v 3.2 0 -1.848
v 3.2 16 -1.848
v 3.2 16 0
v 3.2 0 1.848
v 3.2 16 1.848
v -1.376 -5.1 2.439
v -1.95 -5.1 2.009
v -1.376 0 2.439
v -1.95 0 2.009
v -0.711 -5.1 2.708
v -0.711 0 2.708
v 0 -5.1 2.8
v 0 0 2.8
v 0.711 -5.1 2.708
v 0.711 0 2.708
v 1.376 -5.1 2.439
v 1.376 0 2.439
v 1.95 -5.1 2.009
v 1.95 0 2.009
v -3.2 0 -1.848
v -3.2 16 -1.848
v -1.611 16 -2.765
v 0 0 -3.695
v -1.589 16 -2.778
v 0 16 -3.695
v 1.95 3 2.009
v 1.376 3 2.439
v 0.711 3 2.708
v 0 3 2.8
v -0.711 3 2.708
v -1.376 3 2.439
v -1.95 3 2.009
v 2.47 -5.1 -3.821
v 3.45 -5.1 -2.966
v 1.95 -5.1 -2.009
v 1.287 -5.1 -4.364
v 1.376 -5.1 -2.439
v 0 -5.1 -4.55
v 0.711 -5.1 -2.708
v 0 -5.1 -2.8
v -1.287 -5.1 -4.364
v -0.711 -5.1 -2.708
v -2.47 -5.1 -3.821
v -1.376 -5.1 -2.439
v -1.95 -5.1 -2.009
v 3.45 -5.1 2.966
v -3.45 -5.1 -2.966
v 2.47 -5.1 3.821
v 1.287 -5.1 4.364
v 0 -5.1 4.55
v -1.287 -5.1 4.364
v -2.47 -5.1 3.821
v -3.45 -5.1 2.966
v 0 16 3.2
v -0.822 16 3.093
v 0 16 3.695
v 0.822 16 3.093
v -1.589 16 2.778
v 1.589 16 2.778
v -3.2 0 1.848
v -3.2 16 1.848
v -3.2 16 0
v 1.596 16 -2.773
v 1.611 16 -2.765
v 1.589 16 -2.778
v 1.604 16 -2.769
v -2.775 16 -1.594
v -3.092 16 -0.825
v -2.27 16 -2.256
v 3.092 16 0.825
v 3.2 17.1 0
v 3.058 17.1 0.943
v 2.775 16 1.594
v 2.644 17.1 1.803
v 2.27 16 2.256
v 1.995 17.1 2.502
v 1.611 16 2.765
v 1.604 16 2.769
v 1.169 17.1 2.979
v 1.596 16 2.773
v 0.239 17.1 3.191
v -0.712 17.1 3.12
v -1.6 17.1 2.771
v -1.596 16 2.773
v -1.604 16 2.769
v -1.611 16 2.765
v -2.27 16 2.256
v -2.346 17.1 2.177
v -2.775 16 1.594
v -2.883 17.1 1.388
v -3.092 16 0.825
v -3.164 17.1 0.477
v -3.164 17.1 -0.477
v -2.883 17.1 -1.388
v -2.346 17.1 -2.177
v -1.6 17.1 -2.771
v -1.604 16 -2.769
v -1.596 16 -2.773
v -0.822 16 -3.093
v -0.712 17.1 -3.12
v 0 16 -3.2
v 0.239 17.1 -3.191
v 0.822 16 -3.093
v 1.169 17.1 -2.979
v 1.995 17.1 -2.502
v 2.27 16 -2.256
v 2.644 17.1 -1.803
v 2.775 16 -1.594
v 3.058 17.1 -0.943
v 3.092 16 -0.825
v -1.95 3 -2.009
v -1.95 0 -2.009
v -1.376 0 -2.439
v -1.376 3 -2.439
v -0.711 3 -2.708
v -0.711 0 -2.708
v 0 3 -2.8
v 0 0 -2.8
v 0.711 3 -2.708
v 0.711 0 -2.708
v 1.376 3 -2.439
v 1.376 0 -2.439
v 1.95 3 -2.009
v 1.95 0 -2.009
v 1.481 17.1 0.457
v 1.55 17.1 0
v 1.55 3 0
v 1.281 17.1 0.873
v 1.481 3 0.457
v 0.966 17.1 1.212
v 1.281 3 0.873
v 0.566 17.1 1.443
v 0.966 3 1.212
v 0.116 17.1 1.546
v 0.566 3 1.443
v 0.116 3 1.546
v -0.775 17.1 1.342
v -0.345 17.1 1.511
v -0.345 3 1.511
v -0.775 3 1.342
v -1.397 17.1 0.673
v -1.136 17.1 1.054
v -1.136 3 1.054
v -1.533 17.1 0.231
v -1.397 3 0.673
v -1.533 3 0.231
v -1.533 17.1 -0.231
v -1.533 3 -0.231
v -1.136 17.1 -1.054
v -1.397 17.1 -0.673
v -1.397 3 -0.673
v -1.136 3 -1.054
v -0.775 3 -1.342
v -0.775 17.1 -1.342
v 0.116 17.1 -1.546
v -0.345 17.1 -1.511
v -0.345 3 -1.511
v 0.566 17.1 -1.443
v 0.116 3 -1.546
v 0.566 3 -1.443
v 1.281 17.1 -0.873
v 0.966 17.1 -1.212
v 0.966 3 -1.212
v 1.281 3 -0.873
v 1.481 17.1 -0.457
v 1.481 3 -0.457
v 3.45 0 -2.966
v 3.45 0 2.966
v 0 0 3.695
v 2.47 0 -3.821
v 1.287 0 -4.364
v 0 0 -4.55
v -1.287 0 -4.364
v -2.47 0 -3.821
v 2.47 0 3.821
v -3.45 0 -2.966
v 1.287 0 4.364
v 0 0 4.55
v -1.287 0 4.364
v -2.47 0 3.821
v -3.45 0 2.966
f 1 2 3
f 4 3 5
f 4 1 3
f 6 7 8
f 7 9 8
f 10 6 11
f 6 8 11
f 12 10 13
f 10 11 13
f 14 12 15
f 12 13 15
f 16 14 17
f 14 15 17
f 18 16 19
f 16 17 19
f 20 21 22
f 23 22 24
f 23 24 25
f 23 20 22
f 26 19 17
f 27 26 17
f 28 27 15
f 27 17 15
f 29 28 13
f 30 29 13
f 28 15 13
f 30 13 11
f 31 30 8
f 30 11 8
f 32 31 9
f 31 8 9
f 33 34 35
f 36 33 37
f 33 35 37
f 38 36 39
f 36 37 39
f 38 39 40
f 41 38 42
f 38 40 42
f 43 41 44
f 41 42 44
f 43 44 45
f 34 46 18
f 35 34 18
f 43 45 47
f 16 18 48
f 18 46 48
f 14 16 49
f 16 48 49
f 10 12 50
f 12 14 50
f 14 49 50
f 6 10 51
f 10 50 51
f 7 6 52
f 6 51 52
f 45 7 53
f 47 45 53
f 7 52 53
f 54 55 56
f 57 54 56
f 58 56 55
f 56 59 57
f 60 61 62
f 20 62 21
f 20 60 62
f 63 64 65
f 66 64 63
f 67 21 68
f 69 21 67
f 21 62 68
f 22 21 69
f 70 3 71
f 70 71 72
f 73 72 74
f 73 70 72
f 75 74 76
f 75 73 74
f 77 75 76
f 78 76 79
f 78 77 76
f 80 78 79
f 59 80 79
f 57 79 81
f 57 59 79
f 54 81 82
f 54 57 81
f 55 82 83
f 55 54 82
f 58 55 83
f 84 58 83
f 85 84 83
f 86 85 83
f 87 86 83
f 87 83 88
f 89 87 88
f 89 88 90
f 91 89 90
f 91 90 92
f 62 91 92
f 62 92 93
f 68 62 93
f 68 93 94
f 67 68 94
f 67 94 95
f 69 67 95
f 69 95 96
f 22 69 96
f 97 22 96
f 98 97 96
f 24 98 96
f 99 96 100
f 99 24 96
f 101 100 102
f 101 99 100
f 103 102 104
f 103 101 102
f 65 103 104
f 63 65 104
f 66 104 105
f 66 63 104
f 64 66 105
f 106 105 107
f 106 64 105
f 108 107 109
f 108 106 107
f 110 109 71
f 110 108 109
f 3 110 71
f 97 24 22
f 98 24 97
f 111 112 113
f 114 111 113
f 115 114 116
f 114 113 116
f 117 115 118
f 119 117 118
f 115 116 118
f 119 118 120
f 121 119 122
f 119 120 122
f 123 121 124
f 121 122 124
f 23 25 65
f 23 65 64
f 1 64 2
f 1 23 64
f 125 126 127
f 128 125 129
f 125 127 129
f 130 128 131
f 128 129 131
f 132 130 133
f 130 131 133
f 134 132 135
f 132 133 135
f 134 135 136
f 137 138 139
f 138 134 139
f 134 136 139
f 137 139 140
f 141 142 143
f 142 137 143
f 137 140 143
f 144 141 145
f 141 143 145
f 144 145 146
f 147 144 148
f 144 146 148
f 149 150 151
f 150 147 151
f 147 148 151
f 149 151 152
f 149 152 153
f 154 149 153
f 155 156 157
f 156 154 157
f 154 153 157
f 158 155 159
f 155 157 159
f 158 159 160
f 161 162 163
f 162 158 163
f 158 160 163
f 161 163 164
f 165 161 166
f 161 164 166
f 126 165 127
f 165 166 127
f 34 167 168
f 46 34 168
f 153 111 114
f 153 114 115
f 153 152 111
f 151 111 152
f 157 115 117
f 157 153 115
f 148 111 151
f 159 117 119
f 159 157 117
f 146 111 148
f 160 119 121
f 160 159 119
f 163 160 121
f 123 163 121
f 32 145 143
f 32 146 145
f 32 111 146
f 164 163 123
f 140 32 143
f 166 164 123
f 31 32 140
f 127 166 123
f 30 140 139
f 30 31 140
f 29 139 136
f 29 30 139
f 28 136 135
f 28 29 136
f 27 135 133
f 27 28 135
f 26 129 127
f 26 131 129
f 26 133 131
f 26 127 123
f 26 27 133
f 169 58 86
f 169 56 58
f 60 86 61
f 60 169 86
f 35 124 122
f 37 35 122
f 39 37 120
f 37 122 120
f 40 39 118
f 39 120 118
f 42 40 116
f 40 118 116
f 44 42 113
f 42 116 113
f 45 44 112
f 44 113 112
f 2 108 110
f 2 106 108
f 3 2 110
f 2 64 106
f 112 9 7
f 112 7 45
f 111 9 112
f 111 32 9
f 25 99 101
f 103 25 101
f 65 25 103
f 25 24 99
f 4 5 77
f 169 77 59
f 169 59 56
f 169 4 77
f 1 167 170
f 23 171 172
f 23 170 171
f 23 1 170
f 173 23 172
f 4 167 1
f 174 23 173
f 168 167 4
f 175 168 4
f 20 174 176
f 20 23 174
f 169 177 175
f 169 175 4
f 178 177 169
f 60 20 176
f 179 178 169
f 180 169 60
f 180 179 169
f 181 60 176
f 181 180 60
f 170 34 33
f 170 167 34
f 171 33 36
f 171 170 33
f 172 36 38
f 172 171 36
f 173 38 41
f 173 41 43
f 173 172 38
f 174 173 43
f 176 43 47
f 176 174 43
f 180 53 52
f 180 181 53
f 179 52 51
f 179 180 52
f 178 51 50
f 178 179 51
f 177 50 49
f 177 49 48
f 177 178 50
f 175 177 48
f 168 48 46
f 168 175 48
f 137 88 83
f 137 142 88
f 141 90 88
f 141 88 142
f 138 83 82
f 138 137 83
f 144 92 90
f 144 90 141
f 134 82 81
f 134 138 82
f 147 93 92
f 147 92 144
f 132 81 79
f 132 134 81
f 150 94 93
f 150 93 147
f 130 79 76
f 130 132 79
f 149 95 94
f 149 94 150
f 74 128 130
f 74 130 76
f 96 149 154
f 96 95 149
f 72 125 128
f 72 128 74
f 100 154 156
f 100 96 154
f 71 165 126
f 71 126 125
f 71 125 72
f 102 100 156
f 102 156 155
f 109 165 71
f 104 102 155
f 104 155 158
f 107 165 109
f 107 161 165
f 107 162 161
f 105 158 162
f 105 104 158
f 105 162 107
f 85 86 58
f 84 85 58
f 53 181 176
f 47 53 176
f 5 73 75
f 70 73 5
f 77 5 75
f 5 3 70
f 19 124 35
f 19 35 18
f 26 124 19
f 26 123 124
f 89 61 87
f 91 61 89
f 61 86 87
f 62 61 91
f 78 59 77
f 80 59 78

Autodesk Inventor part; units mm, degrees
ref_plane "YZ Plane" through (0, 0, 0) normal (1, 0, 0) x (0, 1, 0)
ref_plane "XZ Plane" through (0, 0, 0) normal (0, 1, 0) x (-1, 0, 0)
ref_plane "XY Plane" through (0, 0, 0) normal (0, 0, 1) x (1, 0, 0)
sketch "Sketch1" plane through (0, 0, 0) normal (0, 1, 0) x (-1, 0, 0)
  circle A0 centre (0, 0) radius 4.55
  line L0 (3.45, 4.55) -> (3.45, -4.55)
  line L1 (3.45, -4.55) -> (-3.45, -4.55)
  line L2 (-3.45, -4.55) -> (-3.45, 4.55)
  line L3 (-3.45, 4.55) -> (3.45, 4.55)
  line L4 (3.45, 4.55) -> (-3.45, -4.55) construction
  line L5 (3.45, -4.55) -> (-3.45, 4.55) construction
  circle A1 centre (0, 0) radius 2.8
  line L6 (1.95, 2.8) -> (1.95, -2.8)
  line L7 (1.95, -2.8) -> (-1.95, -2.8)
  line L8 (-1.95, -2.8) -> (-1.95, 2.8)
  line L9 (-1.95, 2.8) -> (1.95, 2.8)
  line L10 (1.95, 2.8) -> (-1.95, -2.8) construction
  line L11 (1.95, -2.8) -> (-1.95, 2.8) construction
  point P0 (-3.45, 2.9665)
  point P1 (-3.45, -2.9665)
  point P2 (3.45, -2.9665)
  point P3 (3.45, 2.9665)
  point P4 (-1.95, -2.0094)
  point P5 (-1.95, 2.0094)
  point P6 (1.95, 2.0094)
  point P7 (1.95, -2.0094)
  dimension "d0" = 9.1
  dimension "d1" = 9.1
  dimension "d2" = 6.9
  dimension "d3" = 5.6
  dimension "d4" = 5.6
  dimension "d5" = 3.9
extrude "Extrusion1" add sketch "Sketch1" against normal blind 5.1 contours L0 A0 L2 | A1 L6 | A1 L9 L6 | L6 L7 A1 | A1 L8 L9 | L7 L8 A1 | L8 A1
sketch "Sketch2" plane through (0, 0, 0) normal (0, 1, 0) x (1, 0, 0)
  line L0 (-3.2, 1.8475) -> (0, 3.695)
  line L1 (0, 3.695) -> (3.2, 1.8475)
  line L2 (3.2, 1.8475) -> (3.2, -1.8475)
  line L3 (3.2, -1.8475) -> (0, -3.695)
  line L4 (0, -3.695) -> (-3.2, -1.8475)
  line L5 (-3.2, -1.8475) -> (-3.2, 1.8475)
  circle A0 centre (0, 0) radius 1.55
  dimension "d8" = 6.4
  dimension "d9" = 6.4
  dimension "d10" = 3.1
extrude "Extrusion2" add sketch "Sketch2" along normal blind 16
sketch "Sketch3" plane through (0, 0, 0) normal (0, -1, 0) x (1, 0, 0)
  point P0 (0, 0)
sketch "Sketch4" plane through (0, 0, 0) normal (0, -1, 0) x (1, 0, 0)
  point P0 (0, 0)
sketch "Sketch5" plane through (0, 0, 0) normal (0, -1, 0) x (1, 0, 0)
  circle A0 centre (0, 0) radius 1.55 projected
  line L0 (1.95, -2.0094) -> (1.95, 2.0094) projected
  arc A1 (1.95, 2.0094) -> (-1.95, 2.0094) centre (0, 0) ccw projected
  line L1 (-1.95, 2.0094) -> (-1.95, -2.0094) projected
  arc A2 (-1.95, -2.0094) -> (1.95, -2.0094) centre (0, 0) ccw projected
extrude "Extrusion3" cut sketch "Sketch5" against normal blind 3
sketch "Sketch6" plane through (0, 16, 0) normal (0, 1, 0) x (1, 0, 0)
  circle A0 centre (0, 0) radius 3.2
  circle A1 centre (0, 0) radius 1.55
extrude "Extrusion4" add sketch "Sketch6" along normal blind 1.1
properties part number "motor_to_mecanum_connector"
